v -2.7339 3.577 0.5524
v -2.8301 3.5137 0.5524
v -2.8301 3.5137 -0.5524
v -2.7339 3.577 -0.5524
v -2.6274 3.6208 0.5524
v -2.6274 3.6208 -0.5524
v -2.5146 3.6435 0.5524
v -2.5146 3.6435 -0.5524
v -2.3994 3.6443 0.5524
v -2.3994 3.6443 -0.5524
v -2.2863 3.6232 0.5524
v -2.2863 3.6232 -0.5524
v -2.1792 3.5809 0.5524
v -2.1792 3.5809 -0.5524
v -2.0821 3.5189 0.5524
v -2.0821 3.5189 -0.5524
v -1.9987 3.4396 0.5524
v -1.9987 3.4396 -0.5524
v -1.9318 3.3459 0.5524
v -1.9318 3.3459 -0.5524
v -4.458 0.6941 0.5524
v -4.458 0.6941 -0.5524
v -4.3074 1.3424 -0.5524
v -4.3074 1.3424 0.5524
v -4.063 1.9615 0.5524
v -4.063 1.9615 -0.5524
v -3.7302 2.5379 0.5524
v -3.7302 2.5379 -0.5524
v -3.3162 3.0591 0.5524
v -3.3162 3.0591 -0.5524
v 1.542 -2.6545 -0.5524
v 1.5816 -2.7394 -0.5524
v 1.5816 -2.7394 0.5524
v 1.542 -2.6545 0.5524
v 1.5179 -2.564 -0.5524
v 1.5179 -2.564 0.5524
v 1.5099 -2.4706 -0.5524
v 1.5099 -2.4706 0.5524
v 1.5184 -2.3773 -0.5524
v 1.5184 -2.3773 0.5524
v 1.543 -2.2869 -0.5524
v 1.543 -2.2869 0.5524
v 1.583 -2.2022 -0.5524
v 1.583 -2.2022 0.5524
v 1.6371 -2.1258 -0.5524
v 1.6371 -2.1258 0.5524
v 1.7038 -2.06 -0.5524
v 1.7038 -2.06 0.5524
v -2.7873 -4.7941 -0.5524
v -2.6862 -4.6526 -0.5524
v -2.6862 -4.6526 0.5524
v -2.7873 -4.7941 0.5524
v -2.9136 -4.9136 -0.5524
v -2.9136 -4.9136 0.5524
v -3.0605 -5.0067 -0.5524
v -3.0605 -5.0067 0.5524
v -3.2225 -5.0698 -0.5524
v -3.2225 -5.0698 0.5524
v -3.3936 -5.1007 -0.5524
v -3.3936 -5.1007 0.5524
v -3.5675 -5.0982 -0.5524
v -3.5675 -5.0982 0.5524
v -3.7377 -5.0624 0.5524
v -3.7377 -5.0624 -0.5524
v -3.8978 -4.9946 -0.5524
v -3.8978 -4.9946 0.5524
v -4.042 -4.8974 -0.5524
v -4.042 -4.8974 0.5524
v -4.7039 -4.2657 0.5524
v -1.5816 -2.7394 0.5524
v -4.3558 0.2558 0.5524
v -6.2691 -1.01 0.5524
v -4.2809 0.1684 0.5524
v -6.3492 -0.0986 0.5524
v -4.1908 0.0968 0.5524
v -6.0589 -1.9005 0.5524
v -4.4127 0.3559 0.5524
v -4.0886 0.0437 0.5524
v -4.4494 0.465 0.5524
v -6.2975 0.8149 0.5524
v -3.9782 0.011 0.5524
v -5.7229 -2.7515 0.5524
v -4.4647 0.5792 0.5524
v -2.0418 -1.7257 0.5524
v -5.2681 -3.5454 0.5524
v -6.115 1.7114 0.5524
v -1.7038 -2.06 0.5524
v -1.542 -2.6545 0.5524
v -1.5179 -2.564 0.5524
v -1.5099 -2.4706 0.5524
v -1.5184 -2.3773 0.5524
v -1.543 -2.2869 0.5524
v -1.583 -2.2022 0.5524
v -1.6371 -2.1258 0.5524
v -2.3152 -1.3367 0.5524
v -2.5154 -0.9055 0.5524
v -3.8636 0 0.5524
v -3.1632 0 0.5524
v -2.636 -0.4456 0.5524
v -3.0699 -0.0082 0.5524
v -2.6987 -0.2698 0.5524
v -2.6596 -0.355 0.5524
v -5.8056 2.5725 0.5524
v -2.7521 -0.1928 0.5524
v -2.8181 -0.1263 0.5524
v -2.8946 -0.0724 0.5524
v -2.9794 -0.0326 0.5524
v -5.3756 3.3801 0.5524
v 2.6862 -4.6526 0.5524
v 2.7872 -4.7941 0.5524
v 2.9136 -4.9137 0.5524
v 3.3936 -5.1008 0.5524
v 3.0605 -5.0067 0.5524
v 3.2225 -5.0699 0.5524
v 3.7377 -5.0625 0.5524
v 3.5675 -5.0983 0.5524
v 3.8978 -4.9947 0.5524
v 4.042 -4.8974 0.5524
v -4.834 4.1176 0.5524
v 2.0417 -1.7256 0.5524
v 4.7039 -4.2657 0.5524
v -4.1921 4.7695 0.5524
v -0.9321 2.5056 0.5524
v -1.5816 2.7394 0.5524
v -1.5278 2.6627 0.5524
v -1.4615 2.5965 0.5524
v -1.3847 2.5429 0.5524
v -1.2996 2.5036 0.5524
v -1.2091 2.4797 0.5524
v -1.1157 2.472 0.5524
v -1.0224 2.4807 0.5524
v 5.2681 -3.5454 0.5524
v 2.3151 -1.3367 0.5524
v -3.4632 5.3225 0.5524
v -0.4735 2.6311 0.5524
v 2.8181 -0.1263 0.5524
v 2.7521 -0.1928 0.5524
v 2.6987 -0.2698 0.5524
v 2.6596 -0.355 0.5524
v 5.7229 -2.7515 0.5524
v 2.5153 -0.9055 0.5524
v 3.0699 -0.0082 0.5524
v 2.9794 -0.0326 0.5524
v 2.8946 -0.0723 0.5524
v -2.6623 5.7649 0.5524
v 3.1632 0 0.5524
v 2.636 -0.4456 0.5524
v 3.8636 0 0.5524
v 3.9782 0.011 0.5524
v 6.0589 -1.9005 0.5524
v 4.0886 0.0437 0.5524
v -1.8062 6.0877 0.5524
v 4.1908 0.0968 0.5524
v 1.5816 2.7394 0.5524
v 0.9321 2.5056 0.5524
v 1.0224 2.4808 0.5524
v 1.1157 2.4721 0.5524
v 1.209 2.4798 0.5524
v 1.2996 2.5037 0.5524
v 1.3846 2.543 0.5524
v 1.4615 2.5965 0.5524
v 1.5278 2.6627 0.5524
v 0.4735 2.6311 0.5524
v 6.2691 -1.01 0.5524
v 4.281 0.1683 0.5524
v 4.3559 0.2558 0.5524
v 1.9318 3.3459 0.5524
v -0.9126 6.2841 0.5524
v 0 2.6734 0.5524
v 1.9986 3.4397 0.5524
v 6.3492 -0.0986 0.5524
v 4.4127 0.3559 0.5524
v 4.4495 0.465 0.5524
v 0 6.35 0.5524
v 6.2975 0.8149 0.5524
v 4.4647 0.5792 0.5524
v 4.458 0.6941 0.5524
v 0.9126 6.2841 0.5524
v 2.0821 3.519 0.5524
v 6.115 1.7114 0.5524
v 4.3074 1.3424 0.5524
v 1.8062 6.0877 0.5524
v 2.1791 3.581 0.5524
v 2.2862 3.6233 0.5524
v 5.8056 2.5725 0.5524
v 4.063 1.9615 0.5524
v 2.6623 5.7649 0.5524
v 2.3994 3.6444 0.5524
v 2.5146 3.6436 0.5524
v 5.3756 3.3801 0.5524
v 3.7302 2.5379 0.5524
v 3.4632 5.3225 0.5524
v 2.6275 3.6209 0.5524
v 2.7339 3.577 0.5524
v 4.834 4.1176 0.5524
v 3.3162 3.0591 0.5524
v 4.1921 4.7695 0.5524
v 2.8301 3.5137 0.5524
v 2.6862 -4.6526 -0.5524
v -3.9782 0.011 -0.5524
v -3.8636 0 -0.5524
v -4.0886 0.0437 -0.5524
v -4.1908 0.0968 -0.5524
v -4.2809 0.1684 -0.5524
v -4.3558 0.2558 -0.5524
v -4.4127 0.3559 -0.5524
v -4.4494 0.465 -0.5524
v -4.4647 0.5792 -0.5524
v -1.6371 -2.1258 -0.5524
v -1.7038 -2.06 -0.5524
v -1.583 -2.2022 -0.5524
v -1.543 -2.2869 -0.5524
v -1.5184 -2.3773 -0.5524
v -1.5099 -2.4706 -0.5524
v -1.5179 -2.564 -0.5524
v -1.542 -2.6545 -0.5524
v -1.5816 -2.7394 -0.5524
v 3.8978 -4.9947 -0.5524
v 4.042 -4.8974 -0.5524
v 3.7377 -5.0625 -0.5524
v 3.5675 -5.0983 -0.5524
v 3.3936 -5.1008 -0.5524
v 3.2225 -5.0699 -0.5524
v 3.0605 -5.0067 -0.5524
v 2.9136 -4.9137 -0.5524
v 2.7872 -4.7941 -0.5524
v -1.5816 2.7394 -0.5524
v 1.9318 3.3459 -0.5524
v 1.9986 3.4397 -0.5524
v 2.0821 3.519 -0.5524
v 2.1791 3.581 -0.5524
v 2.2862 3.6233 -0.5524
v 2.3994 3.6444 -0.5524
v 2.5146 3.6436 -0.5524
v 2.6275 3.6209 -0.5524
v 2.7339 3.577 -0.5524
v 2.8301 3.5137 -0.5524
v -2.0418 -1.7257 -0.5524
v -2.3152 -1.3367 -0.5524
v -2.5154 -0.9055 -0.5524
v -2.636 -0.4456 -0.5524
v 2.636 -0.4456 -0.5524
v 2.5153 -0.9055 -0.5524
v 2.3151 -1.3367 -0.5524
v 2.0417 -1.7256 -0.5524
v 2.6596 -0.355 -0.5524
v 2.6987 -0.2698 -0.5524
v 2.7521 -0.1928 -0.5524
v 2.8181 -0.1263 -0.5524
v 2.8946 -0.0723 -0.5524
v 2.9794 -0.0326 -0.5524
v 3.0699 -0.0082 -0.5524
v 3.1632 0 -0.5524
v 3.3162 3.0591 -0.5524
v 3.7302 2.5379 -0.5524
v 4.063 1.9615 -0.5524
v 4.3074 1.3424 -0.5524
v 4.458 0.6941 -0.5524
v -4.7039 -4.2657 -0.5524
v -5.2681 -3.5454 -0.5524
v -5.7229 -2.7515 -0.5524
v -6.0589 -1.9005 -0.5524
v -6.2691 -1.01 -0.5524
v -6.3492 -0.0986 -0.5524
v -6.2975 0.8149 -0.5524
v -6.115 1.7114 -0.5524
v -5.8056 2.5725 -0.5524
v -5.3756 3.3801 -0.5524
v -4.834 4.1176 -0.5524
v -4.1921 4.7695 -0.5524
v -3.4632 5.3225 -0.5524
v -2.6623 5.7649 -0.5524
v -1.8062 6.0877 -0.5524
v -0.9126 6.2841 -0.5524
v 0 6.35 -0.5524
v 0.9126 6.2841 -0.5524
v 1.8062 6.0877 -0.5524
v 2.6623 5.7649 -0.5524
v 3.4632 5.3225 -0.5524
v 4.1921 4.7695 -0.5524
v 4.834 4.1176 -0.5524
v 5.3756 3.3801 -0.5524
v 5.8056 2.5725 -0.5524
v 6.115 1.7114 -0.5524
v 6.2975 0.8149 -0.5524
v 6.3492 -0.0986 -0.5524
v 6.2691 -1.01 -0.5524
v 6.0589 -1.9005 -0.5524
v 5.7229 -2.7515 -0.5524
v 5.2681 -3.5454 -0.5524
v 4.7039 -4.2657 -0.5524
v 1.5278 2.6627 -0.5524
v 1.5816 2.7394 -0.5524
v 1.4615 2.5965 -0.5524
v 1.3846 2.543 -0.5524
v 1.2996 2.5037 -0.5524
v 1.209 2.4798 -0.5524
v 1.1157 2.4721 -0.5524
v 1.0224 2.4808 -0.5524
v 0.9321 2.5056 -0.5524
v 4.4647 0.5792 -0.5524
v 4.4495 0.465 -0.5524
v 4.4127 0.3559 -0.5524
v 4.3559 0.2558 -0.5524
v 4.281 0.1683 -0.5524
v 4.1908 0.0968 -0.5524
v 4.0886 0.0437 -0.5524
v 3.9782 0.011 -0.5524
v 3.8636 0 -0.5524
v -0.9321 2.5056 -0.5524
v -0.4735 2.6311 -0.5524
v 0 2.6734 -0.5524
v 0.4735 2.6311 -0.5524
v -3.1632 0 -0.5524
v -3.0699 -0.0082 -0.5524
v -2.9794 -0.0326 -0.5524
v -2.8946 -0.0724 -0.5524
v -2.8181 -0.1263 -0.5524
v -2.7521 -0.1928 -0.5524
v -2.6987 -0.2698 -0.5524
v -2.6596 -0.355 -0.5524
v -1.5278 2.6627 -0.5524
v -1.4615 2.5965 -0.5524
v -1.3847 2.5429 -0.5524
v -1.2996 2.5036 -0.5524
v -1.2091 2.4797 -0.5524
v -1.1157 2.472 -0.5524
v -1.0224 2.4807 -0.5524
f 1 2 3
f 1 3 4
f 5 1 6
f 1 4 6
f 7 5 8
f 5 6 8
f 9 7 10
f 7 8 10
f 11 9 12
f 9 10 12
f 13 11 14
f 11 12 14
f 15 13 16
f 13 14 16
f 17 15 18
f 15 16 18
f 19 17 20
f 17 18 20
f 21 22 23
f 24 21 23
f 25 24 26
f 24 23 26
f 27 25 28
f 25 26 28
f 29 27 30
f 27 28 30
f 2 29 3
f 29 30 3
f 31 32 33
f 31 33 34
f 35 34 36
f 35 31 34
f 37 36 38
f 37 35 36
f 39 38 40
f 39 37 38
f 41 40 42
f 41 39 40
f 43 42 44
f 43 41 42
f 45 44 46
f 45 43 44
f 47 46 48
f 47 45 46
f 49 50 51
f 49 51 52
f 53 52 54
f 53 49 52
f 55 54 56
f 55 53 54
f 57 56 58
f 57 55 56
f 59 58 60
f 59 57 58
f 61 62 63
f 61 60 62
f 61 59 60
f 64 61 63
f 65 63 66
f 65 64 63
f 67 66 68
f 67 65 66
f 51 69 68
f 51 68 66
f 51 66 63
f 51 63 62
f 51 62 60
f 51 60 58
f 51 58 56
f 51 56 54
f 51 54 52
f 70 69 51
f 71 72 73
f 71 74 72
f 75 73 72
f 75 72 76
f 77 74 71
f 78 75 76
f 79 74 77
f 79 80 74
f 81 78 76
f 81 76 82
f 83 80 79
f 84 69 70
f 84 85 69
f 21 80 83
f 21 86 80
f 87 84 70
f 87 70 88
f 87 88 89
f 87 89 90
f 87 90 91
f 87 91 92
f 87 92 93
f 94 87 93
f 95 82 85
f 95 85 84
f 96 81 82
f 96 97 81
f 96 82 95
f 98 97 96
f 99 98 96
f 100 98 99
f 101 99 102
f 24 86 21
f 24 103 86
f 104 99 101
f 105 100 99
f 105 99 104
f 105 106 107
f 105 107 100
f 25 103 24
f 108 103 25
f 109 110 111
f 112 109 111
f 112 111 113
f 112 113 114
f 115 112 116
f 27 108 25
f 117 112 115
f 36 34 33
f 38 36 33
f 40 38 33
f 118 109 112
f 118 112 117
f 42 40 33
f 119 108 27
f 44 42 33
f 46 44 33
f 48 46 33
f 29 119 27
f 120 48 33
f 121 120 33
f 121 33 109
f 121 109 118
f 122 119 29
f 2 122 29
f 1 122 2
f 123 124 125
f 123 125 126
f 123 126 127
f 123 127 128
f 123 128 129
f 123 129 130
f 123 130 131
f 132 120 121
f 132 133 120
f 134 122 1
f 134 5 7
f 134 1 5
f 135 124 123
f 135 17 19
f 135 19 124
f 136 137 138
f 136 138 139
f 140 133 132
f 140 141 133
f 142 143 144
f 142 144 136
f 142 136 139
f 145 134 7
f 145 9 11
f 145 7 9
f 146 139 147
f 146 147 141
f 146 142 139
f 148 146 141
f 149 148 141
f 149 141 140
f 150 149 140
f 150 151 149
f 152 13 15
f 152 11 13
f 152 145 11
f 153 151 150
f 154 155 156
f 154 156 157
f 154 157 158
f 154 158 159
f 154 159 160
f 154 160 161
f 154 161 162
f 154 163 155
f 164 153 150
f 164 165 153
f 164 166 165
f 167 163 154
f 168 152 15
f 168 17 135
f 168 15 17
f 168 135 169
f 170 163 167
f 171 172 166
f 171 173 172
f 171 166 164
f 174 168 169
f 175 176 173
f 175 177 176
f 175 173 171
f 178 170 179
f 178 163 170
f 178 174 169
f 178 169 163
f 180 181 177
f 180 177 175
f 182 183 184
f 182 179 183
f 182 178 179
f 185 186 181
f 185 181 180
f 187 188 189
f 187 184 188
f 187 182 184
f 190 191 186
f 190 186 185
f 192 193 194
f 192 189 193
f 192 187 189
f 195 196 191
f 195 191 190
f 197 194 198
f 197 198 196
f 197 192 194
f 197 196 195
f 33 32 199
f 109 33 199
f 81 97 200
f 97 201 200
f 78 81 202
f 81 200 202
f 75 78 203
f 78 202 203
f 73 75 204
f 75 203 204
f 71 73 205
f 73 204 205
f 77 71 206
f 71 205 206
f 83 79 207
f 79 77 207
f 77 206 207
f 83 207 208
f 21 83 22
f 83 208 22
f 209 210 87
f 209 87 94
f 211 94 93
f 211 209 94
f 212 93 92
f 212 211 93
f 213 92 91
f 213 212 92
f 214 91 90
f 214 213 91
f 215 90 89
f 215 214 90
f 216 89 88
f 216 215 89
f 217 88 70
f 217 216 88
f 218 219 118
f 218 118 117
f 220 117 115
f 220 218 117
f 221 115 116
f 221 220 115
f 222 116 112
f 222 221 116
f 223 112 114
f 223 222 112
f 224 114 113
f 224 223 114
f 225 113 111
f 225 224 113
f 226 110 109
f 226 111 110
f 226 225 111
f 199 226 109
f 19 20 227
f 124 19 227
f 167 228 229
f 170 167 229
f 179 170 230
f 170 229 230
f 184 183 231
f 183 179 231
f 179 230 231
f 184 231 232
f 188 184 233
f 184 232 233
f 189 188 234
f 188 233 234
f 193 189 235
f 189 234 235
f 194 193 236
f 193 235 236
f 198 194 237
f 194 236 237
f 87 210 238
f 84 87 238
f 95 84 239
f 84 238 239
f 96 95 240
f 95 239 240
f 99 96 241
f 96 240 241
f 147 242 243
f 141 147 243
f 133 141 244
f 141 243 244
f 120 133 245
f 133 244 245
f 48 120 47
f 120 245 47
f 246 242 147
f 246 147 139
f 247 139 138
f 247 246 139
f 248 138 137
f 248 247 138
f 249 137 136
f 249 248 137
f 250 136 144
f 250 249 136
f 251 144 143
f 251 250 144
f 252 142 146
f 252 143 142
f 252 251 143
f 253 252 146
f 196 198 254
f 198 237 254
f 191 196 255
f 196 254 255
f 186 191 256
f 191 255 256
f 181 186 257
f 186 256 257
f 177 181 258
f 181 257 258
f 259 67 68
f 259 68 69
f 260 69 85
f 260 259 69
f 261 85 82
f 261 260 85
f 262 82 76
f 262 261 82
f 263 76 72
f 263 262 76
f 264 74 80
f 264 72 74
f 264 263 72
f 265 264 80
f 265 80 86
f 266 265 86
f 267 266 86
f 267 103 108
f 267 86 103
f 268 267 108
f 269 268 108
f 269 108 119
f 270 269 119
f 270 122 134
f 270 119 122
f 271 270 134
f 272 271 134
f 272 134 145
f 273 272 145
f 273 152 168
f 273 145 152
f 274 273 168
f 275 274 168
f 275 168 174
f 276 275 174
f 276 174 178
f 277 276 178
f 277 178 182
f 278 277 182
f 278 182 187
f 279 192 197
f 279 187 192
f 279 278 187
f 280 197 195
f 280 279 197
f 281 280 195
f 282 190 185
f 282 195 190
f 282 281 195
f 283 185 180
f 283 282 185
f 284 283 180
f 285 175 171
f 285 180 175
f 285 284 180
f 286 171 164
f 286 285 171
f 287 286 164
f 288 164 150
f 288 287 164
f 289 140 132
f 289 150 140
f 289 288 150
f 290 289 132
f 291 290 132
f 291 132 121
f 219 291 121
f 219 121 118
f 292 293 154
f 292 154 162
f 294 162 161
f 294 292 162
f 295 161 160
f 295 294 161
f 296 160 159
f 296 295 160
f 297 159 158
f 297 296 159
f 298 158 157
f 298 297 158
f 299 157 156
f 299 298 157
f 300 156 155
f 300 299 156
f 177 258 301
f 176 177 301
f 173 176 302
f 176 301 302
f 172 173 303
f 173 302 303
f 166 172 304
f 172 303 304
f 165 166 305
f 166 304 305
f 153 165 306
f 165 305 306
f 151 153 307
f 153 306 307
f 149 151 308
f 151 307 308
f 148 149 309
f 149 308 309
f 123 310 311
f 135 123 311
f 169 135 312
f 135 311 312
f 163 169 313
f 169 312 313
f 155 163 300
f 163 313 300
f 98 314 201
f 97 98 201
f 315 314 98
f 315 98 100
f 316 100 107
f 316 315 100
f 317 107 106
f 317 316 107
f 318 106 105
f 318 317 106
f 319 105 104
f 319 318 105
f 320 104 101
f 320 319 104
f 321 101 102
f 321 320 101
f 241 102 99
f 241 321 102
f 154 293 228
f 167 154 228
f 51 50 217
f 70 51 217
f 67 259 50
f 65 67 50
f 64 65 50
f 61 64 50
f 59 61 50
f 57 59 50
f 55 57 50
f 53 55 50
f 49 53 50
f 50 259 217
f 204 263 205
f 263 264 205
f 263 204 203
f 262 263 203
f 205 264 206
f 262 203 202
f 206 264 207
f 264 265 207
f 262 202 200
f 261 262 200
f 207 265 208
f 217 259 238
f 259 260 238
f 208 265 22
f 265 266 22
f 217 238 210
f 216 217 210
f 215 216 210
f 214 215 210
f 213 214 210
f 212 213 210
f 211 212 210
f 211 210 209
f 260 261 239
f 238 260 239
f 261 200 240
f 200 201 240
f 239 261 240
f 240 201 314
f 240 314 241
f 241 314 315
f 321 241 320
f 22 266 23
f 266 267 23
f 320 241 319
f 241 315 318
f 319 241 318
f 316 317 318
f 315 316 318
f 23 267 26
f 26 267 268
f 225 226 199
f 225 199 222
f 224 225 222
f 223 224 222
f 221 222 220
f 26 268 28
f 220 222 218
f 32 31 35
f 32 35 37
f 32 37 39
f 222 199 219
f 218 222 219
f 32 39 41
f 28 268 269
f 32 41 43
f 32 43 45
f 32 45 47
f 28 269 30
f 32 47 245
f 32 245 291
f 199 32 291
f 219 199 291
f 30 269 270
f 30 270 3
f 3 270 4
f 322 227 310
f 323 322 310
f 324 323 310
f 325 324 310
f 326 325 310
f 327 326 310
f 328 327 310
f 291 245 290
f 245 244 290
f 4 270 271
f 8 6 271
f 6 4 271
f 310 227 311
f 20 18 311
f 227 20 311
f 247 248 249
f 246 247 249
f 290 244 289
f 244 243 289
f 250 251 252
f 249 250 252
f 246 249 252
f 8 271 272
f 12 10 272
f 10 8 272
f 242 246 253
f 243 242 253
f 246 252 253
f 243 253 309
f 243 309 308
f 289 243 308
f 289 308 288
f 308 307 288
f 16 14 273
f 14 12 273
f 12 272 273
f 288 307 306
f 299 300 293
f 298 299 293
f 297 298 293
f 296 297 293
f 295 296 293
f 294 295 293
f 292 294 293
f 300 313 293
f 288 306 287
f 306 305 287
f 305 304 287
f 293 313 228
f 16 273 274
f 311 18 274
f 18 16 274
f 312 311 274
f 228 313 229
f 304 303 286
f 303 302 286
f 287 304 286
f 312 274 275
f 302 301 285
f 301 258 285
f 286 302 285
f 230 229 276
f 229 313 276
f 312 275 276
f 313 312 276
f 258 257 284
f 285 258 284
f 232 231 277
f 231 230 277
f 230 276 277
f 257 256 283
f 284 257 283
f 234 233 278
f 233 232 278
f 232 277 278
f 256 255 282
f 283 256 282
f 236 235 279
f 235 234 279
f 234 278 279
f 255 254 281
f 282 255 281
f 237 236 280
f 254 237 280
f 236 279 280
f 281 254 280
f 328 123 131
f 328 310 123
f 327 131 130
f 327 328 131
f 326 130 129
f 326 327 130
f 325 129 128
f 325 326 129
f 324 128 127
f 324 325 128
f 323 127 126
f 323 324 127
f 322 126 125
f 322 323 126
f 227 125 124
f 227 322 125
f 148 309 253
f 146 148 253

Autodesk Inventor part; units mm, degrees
sketch "Sketch_1" plane through (0, 0, 0) normal (0, 0, 1) x (1, 0, 0)
  arc A0 (4.042, -4.8974) -> (-4.042, -4.8974) centre (0, 0) ccw
  arc A1 (-4.042, -4.8974) -> (-2.6862, -4.6526) centre (-3.4677, -4.2015) ccw
  line L0 (-2.6862, -4.6526) -> (-1.5816, -2.7394)
  arc A2 (-1.5816, -2.7394) -> (-1.7038, -2.06) centre (-2.0446, -2.472) ccw
  arc A3 (-2.636, -0.4456) -> (-1.7038, -2.06) centre (0, 0) ccw
  arc A4 (-2.636, -0.4456) -> (-3.1632, 0) centre (-3.1632, -0.5347) ccw
  line L1 (-3.1632, 0) -> (-3.8636, 0)
  arc A5 (-4.458, 0.6941) -> (-3.8636, 0) centre (-3.8636, 0.6016) ccw
  arc A6 (-2.8301, 3.5137) -> (-4.458, 0.6941) centre (0, 0) ccw
  arc A7 (-1.9318, 3.3459) -> (-2.8301, 3.5137) centre (-2.4527, 3.0452) ccw
  line L2 (-1.9318, 3.3459) -> (-1.5816, 2.7394)
  arc A8 (-1.5816, 2.7394) -> (-0.9321, 2.5056) centre (-1.1185, 3.0067) ccw
  arc A9 (0.9321, 2.5056) -> (-0.9321, 2.5056) centre (0, 0) ccw
  arc A10 (0.9321, 2.5056) -> (1.5816, 2.7394) centre (1.1185, 3.0067) ccw
  line L3 (1.5816, 2.7394) -> (1.9318, 3.3459)
  arc A11 (2.8301, 3.5137) -> (1.9318, 3.3459) centre (2.4527, 3.0452) ccw
  arc A12 (4.458, 0.6941) -> (2.8301, 3.5137) centre (0, 0) ccw
  arc A13 (3.8636, 0) -> (4.458, 0.6941) centre (3.8636, 0.6016) ccw
  line L4 (3.8636, 0) -> (3.1632, 0)
  arc A14 (3.1632, 0) -> (2.636, -0.4456) centre (3.1632, -0.5347) ccw
  arc A15 (1.7038, -2.06) -> (2.636, -0.4456) centre (0, 0) ccw
  arc A16 (1.7038, -2.06) -> (1.5816, -2.7394) centre (2.0446, -2.472) ccw
  line L5 (1.5816, -2.7394) -> (2.6862, -4.6526)
  arc A17 (2.6862, -4.6526) -> (4.042, -4.8974) centre (3.4677, -4.2015) ccw
extrude "Extrusion1" add sketch "Sketch_1" along normal mid plane 1.1049
ref_plane "RR_XY" through (0, 0, 0) normal (0, 0, 1) x (1, 0, 0)
ref_plane "RR_YZ" through (0, 0, 0) normal (1, 0, 0) x (0, 1, 0)
ref_plane "RR_ZX" through (0, 0, 0) normal (0, 1, 0) x (0, 0, 1)
properties part number "D-5866"
